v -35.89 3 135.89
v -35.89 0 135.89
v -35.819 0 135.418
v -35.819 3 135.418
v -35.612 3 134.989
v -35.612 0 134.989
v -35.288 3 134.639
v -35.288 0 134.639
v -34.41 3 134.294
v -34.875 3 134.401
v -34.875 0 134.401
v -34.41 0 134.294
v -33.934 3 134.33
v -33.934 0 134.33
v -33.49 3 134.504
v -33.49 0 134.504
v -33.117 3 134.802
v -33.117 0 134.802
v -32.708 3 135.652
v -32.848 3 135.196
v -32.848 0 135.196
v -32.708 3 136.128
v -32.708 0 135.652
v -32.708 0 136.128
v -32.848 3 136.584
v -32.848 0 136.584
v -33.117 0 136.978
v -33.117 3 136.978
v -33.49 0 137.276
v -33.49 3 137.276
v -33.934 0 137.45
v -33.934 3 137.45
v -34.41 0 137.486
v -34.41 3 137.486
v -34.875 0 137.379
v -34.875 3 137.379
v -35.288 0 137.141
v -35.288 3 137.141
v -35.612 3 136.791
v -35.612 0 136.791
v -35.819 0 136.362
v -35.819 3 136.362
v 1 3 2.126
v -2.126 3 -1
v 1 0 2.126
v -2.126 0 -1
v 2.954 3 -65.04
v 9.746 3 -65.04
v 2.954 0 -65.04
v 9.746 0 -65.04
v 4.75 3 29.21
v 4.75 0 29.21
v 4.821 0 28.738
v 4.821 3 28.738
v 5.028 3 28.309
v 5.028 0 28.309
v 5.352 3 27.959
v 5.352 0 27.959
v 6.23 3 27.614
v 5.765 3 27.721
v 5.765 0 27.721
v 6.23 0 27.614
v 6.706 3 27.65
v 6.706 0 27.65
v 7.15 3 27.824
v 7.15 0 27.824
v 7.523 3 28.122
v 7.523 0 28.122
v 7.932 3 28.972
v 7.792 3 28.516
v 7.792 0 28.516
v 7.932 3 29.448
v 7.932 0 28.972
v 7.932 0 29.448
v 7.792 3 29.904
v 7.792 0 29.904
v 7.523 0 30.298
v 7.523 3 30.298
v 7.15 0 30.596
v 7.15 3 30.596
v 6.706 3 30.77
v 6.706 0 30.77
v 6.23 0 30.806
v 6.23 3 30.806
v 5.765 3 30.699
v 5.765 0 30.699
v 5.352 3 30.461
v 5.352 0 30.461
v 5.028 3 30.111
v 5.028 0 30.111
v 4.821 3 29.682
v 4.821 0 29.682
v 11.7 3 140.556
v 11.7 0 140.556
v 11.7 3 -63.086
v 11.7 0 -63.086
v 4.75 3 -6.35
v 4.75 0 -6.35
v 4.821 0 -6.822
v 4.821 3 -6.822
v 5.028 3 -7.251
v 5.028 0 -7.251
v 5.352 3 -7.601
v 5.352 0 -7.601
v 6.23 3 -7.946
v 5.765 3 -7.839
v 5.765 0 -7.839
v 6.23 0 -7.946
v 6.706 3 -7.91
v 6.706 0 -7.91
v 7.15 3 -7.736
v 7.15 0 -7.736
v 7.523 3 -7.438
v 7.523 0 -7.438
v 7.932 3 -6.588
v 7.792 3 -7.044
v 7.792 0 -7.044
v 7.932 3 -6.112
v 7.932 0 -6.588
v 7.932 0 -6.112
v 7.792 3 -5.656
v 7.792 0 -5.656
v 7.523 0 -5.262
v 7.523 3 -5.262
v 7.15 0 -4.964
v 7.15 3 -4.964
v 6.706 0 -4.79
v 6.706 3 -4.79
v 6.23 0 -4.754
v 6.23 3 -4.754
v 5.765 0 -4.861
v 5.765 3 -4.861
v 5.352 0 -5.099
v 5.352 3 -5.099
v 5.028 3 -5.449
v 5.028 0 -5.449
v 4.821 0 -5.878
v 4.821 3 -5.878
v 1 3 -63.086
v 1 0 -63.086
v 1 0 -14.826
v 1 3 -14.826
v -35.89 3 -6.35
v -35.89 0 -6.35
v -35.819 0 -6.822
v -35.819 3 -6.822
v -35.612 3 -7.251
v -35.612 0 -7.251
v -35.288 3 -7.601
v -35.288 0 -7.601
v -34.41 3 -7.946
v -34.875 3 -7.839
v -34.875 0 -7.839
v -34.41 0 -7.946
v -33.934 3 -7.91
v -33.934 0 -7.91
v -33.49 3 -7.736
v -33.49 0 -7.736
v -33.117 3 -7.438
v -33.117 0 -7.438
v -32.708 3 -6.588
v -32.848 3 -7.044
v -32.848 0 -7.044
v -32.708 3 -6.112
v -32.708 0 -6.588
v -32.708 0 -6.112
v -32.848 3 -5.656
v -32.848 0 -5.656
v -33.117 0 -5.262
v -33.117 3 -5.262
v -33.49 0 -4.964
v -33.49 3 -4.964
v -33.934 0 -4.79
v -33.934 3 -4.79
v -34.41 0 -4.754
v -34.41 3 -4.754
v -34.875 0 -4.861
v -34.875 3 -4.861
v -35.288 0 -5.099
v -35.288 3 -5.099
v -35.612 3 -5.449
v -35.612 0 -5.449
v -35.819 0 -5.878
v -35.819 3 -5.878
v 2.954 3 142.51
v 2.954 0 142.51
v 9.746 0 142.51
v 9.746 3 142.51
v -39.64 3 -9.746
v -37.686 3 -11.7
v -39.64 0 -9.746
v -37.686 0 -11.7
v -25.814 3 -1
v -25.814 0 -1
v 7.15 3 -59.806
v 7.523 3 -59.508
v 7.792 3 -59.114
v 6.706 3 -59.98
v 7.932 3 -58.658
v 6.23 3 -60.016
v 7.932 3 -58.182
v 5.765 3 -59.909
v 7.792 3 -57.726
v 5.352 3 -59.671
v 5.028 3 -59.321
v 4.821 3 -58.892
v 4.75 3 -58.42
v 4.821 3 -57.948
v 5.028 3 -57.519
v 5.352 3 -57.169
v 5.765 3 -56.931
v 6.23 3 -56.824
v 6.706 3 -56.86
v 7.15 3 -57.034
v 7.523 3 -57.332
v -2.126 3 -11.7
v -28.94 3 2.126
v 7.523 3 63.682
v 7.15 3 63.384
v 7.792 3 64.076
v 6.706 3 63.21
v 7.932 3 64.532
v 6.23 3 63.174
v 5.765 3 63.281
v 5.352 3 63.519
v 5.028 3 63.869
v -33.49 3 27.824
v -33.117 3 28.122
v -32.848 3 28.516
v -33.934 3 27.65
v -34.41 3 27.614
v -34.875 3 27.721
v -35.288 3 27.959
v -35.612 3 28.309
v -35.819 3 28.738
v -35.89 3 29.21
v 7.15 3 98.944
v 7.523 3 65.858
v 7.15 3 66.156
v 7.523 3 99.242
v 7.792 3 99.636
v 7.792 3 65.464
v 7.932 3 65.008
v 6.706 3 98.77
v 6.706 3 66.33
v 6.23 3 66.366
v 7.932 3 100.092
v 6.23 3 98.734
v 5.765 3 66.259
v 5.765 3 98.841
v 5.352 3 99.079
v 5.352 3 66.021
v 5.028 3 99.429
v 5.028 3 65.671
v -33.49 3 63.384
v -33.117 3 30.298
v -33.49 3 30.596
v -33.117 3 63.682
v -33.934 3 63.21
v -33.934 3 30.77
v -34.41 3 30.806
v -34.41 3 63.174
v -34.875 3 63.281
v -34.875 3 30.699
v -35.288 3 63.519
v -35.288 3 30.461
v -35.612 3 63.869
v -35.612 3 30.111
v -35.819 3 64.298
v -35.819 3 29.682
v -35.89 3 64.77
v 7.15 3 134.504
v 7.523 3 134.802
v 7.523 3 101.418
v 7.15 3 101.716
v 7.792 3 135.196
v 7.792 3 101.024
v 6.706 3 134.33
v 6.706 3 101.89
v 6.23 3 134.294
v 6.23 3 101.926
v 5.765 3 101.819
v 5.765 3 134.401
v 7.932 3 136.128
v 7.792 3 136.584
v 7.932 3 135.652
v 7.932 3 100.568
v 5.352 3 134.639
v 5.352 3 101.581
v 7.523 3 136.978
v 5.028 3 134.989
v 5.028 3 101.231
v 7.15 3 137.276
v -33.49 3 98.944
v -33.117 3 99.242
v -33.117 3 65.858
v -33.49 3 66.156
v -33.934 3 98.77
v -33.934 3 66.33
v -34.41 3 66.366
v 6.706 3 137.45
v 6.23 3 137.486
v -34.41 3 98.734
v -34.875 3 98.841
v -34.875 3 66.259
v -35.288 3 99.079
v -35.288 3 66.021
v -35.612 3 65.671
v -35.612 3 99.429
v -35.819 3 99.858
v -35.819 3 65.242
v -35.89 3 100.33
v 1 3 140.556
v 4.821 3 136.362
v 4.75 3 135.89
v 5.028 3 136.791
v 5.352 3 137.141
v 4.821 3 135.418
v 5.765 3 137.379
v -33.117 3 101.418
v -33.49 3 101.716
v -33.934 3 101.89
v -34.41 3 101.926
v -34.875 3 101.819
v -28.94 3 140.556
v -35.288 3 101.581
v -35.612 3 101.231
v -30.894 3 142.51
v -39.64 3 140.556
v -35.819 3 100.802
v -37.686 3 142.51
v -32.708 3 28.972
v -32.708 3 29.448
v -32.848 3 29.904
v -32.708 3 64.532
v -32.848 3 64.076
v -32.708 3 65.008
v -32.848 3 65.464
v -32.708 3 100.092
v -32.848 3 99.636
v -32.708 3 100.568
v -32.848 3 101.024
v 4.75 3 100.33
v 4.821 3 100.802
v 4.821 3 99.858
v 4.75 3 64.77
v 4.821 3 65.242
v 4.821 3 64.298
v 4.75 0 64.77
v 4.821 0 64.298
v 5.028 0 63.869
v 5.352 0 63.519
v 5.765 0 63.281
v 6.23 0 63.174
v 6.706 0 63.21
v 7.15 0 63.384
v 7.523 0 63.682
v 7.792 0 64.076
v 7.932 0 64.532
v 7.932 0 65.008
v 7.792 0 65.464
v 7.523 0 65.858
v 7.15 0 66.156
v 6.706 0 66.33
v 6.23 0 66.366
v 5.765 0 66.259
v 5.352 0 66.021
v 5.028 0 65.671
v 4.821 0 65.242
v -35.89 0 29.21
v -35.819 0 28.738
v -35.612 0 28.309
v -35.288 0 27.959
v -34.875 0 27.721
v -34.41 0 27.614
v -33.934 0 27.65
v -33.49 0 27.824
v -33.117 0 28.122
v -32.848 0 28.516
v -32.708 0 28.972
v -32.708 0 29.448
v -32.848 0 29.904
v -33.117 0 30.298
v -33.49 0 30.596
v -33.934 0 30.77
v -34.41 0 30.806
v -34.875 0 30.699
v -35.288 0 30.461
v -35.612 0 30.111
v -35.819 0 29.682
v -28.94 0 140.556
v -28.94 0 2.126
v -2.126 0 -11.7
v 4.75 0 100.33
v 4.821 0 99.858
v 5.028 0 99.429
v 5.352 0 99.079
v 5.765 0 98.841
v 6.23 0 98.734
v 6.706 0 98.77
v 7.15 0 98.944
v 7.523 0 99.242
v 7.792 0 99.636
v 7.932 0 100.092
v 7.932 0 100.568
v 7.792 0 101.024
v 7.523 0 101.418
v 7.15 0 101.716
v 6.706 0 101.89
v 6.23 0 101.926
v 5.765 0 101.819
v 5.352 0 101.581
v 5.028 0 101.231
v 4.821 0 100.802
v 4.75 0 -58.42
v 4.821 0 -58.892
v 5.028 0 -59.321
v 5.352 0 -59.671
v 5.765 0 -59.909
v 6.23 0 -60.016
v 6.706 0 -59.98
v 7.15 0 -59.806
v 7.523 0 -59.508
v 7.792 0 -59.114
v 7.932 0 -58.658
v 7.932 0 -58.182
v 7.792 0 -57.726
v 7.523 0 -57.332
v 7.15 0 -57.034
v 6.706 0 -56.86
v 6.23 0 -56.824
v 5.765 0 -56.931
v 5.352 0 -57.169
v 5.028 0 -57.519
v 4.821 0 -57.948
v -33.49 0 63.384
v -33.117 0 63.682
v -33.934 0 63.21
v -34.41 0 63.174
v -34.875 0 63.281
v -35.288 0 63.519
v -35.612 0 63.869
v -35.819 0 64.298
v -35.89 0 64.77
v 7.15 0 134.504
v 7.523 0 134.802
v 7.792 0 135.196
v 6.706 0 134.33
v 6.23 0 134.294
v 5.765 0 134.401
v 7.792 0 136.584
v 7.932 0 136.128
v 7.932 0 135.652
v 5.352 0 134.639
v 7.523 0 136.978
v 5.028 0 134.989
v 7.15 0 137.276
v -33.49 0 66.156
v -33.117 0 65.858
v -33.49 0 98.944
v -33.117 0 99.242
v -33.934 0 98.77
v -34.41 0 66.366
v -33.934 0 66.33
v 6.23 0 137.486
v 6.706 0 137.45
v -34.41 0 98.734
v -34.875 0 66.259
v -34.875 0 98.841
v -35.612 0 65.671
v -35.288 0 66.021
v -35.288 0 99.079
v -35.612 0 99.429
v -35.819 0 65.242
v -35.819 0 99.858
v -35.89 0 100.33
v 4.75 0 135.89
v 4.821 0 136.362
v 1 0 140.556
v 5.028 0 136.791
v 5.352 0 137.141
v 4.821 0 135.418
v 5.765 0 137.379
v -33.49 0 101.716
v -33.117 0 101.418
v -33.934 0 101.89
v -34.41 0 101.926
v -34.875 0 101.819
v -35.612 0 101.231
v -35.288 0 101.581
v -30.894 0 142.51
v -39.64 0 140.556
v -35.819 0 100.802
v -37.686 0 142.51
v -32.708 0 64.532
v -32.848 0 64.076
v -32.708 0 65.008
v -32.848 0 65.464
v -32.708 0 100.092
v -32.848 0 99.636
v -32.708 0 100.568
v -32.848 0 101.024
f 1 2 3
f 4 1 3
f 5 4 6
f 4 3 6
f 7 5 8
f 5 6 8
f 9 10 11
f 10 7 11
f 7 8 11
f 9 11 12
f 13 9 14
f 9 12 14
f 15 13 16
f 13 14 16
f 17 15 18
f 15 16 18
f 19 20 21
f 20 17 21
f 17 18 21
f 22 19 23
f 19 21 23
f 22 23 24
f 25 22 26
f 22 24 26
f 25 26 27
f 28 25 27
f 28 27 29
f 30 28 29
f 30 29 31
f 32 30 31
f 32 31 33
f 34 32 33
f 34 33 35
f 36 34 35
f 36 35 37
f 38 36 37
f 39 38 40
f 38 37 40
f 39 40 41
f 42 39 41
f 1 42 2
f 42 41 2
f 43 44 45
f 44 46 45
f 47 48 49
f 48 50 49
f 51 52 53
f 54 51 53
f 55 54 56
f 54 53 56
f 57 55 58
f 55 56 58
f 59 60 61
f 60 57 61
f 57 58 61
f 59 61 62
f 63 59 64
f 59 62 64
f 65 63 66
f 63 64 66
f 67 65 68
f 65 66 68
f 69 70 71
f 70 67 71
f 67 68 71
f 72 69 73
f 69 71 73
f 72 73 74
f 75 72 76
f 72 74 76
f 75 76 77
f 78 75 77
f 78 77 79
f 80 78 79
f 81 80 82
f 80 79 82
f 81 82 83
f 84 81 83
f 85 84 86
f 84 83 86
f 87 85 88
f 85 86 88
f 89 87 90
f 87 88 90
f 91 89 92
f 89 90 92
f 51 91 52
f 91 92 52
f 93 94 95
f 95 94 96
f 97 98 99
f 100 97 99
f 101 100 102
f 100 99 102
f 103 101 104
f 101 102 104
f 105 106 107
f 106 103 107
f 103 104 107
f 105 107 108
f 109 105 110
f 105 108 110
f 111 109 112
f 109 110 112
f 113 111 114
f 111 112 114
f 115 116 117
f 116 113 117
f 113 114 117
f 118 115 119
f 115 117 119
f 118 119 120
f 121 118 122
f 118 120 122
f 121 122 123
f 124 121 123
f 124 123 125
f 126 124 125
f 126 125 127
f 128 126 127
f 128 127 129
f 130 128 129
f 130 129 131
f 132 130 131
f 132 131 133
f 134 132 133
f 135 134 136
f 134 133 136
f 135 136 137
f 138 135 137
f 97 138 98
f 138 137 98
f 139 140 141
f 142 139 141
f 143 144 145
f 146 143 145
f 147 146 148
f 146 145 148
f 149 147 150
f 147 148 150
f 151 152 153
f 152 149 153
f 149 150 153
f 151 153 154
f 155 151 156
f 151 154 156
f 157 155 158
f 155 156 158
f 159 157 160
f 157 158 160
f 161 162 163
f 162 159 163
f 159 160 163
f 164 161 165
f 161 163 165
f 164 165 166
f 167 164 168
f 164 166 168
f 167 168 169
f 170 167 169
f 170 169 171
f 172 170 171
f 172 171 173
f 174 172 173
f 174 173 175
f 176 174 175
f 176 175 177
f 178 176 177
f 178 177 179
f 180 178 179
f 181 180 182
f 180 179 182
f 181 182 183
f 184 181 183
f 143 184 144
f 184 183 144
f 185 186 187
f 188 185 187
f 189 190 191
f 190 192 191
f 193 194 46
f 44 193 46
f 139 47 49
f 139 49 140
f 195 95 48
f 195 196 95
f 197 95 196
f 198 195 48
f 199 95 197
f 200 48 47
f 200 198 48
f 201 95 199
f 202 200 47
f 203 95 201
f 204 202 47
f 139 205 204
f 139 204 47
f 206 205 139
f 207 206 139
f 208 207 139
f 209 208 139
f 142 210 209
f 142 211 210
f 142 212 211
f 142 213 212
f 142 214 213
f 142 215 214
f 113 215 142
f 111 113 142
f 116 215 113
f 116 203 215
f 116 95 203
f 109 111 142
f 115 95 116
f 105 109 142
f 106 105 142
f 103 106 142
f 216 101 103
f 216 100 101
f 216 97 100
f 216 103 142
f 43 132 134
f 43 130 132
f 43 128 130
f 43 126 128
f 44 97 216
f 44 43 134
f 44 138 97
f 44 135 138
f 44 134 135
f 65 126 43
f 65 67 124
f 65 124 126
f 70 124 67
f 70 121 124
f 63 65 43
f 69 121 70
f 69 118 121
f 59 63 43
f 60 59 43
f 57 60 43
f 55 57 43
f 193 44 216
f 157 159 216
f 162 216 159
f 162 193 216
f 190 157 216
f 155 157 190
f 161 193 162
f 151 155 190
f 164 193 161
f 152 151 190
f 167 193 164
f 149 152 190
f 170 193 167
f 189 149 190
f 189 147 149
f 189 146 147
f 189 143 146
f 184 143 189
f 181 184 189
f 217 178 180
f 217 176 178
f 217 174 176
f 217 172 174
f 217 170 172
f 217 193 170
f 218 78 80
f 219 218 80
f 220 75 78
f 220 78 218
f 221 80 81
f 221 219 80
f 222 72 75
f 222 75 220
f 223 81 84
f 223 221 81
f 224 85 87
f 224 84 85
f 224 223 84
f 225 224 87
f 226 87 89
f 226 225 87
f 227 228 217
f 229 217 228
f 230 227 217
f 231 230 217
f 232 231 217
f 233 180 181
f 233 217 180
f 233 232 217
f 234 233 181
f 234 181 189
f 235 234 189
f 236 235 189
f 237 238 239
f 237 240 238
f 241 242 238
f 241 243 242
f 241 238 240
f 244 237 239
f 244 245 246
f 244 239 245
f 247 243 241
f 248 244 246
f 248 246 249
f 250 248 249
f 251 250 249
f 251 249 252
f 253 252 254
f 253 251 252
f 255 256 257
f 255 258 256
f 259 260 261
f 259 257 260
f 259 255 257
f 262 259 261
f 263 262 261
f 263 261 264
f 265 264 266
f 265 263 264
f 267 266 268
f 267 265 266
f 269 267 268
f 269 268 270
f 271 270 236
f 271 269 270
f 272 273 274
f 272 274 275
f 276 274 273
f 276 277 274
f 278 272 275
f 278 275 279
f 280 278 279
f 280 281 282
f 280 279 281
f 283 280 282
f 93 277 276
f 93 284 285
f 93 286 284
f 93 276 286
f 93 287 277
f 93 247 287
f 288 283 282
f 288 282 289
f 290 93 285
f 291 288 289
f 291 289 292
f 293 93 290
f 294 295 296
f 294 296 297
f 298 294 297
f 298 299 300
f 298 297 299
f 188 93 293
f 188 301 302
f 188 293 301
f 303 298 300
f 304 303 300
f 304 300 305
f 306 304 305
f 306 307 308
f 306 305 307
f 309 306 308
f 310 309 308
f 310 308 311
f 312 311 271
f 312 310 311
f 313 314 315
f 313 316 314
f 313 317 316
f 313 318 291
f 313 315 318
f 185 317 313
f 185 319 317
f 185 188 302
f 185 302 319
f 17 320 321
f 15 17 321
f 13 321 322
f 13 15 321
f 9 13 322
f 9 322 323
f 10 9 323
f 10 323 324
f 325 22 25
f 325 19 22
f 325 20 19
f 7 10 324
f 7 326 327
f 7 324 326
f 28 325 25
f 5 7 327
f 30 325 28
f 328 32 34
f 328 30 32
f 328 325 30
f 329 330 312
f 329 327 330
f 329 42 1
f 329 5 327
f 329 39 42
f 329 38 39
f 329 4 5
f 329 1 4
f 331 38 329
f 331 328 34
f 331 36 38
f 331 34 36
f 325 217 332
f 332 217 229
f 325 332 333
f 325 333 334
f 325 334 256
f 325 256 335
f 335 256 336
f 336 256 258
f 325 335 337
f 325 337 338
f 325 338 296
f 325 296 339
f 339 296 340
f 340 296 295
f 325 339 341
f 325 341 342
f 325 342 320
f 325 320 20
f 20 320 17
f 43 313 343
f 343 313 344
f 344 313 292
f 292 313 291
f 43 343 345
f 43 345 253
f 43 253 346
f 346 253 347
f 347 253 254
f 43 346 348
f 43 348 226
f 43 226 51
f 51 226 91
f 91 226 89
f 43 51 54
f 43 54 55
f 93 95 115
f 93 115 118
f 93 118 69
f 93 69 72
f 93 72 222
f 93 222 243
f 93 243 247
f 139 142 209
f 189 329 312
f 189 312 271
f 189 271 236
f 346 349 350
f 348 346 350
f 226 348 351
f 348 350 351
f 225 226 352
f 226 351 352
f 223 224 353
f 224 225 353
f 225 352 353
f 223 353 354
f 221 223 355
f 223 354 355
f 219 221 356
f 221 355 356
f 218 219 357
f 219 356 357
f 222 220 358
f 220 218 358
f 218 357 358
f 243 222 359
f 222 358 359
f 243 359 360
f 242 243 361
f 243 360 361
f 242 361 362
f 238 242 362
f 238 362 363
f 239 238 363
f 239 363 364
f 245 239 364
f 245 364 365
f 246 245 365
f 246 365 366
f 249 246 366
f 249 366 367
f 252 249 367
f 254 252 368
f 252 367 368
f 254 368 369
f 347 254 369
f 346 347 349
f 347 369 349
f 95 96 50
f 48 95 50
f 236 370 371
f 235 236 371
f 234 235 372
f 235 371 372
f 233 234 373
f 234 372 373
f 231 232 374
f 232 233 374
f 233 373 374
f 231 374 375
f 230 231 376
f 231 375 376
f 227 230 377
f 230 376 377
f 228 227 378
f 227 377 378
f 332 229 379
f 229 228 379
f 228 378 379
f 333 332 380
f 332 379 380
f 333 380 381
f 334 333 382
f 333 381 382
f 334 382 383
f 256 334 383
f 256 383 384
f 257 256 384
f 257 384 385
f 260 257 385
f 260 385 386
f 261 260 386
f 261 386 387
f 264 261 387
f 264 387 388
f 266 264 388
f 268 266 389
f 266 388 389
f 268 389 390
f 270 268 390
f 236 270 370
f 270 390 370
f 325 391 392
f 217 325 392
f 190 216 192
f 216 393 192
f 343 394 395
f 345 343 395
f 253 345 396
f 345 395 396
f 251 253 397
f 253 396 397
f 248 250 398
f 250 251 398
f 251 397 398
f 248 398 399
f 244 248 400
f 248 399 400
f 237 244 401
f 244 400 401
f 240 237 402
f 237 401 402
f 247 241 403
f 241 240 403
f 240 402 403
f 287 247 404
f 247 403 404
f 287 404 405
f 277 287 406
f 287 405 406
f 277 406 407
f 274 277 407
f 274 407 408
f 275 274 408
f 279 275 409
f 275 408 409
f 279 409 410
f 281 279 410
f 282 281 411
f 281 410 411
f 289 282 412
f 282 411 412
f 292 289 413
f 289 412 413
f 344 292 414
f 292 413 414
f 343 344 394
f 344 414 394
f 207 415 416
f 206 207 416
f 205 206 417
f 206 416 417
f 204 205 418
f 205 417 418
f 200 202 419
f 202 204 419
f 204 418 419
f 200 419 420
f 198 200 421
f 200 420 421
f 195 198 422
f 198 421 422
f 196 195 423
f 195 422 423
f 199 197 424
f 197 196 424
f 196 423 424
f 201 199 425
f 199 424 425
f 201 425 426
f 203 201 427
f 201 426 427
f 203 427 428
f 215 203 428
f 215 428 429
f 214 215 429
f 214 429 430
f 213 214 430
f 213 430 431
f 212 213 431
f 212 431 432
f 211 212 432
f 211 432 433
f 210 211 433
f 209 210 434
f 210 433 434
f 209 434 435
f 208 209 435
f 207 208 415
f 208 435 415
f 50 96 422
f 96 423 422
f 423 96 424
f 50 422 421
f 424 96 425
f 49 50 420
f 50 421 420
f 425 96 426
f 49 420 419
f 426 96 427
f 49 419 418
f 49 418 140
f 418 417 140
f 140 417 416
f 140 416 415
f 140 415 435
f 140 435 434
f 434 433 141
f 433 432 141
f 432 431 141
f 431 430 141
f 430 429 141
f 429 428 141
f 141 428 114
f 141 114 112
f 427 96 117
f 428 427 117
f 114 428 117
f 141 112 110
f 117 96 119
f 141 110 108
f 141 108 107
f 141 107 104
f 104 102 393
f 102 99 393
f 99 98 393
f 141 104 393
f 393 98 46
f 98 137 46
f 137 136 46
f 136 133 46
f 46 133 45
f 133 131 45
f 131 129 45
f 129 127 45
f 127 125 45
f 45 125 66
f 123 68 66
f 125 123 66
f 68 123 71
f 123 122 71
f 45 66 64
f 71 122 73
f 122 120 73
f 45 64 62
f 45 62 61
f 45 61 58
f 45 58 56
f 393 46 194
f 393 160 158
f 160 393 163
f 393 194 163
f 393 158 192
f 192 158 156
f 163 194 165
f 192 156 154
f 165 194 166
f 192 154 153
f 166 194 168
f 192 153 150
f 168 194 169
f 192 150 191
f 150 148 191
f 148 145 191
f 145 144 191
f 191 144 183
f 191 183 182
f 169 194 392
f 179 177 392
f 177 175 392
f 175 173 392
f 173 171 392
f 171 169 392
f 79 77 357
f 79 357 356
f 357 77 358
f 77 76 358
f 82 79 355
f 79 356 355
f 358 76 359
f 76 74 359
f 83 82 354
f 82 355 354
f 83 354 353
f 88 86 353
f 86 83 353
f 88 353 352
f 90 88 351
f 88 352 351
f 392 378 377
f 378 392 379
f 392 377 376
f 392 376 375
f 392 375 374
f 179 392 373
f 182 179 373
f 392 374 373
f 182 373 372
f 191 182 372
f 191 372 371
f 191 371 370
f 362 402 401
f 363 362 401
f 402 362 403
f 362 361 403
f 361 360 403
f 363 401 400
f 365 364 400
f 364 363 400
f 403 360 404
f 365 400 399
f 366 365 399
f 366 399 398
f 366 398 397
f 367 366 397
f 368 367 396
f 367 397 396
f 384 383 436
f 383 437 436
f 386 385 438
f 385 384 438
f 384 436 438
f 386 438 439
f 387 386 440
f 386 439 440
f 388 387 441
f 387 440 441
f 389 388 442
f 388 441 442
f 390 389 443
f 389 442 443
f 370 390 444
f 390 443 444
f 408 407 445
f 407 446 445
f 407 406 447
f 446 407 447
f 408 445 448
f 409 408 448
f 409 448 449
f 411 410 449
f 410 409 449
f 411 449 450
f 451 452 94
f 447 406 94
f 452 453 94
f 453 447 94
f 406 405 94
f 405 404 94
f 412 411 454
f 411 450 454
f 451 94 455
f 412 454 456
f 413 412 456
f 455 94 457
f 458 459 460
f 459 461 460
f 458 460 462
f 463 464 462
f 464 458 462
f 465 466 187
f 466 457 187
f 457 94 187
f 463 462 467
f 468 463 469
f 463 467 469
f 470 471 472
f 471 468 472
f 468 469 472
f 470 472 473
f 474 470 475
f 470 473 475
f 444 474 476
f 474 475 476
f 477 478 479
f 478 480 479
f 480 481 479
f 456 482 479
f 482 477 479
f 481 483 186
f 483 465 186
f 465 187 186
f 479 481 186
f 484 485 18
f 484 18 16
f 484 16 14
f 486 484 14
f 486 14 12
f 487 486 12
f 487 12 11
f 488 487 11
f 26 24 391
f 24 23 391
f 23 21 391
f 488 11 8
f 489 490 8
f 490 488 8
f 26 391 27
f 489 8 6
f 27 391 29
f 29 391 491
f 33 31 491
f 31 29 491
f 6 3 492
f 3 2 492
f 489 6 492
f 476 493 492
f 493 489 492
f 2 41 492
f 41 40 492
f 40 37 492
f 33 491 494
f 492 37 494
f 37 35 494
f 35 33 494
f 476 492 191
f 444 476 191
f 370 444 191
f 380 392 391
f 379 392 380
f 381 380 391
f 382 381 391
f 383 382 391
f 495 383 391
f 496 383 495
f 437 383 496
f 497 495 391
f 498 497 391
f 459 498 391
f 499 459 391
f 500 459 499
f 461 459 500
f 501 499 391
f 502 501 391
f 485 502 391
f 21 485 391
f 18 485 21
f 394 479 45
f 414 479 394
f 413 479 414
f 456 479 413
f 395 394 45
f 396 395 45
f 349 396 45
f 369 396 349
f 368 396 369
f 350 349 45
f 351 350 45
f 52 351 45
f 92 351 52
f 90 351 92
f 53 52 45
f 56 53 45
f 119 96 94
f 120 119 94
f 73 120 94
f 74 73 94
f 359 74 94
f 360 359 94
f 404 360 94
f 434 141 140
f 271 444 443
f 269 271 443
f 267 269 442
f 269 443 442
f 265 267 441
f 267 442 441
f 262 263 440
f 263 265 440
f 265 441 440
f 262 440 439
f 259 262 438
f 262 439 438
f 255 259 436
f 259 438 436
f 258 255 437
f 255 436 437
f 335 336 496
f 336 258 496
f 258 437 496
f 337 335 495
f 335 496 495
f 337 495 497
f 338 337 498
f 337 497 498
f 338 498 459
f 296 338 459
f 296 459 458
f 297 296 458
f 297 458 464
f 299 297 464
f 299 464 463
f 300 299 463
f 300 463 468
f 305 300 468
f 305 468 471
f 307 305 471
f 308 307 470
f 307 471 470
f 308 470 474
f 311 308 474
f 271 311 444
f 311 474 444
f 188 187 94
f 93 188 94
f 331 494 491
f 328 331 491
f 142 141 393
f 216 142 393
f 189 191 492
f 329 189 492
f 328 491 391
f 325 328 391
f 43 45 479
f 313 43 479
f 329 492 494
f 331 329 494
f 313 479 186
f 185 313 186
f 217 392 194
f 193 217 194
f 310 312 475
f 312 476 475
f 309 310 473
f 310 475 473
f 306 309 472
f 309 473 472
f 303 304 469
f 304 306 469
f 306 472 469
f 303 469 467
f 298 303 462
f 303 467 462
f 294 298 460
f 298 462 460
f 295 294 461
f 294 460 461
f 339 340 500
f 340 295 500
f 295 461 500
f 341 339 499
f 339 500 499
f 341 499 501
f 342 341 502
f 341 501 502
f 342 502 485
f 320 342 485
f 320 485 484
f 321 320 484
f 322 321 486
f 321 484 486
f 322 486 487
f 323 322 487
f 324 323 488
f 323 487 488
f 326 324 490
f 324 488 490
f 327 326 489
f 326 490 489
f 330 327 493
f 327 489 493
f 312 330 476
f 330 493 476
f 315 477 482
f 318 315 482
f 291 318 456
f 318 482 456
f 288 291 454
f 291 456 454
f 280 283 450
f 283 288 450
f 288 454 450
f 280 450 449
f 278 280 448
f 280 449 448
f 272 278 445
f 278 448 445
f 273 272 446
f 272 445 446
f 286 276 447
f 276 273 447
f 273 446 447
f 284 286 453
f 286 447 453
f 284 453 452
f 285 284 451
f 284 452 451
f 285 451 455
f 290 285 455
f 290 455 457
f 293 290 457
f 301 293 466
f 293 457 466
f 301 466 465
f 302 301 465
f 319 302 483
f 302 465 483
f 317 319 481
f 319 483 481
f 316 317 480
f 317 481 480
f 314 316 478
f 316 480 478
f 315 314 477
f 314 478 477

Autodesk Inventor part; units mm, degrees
ref_plane "YZ Plane" through (0, 0, 0) normal (1, 0, 0) x (0, 1, 0)
ref_plane "XZ Plane" through (0, 0, 0) normal (0, 1, 0) x (-1, 0, 0)
ref_plane "XY Plane" through (0, 0, 0) normal (0, 0, 1) x (1, 0, 0)
sketch "Szkic1" plane through (0, 0, 0) normal (0, 1, 0) x (-1, 0, 0)
  line L0 (38.1, 143.51) -> (30.48, 143.51)
  line L1 (27.94, 140.97) -> (27.94, 2.54)
  line L2 (25.4, 0) -> (2.54, 0)
  line L3 (0, 2.54) -> (0, 140.97)
  line L4 (-2.54, 143.51) -> (-10.16, 143.51)
  line L5 (-12.7, 140.97) -> (-12.7, -63.5)
  line L6 (-10.16, -66.04) -> (-2.54, -66.04)
  line L7 (0, -63.5) -> (0, -15.24)
  line L8 (2.54, -12.7) -> (38.1, -12.7)
  line L9 (40.64, -10.16) -> (40.64, 140.97)
  line L10 (34.29, 143.51) -> (34.29, -12.7) construction
  line L11 (-6.35, -66.04) -> (-6.35, 143.51) construction
  circle A0 centre (34.29, -6.35) radius 1.6
  circle A1 centre (-6.35, -6.35) radius 1.6
  circle A2 centre (34.29, 29.21) radius 1.6
  circle A3 centre (-6.35, 29.21) radius 1.6
  circle A4 centre (34.29, 64.77) radius 1.6
  circle A5 centre (-6.35, 64.77) radius 1.6
  circle A6 centre (34.29, 100.33) radius 1.6
  circle A7 centre (-6.35, 100.33) radius 1.6
  circle A8 centre (34.29, 135.89) radius 1.6
  circle A9 centre (-6.35, 135.89) radius 1.6
  circle A10 centre (-6.35, -58.42) radius 1.6
  line L12 (40.64, -10.16) -> (38.1, -12.7)
  line L13 (25.4, 0) -> (27.94, 2.54)
  line L14 (2.54, -12.7) -> (0, -15.24)
  line L15 (0, 2.54) -> (2.54, 0)
  line L16 (-2.54, -66.04) -> (0, -63.5)
  line L17 (-10.16, -66.04) -> (-12.7, -63.5)
  line L18 (-2.54, 143.51) -> (0, 140.97)
  line L19 (-10.16, 143.51) -> (-12.7, 140.97)
  line L20 (27.94, 140.97) -> (30.48, 143.51)
  line L21 (38.1, 143.51) -> (40.64, 140.97)
  line L22 (19.05, 0) -> (19.05, -6.35) construction
  line L23 (19.05, -6.35) -> (19.05, -12.7) construction
  line L24 (19.05, -6.35) -> (34.29, -6.35) construction
  line L25 (19.05, -6.35) -> (-6.35, -6.35) construction
  line L26 (39.64, 140.5558) -> (37.6858, 142.51)
  line L27 (37.6858, 142.51) -> (30.8942, 142.51)
  line L28 (30.8942, 142.51) -> (28.94, 140.5558)
  line L29 (28.94, 140.5558) -> (28.94, 2.1258)
  line L30 (28.94, 2.1258) -> (25.8142, -1)
  line L31 (25.8142, -1) -> (2.1258, -1)
  line L32 (2.1258, -1) -> (-1, 2.1258)
  line L33 (-1, 2.1258) -> (-1, 140.5558)
  line L34 (-1, 140.5558) -> (-2.9542, 142.51)
  line L35 (-2.9542, 142.51) -> (-9.7458, 142.51)
  line L36 (-9.7458, 142.51) -> (-11.7, 140.5558)
  line L37 (-11.7, 140.5558) -> (-11.7, -63.0858)
  line L38 (-11.7, -63.0858) -> (-9.7458, -65.04)
  line L39 (-9.7458, -65.04) -> (-2.9542, -65.04)
  line L40 (-2.9542, -65.04) -> (-1, -63.0858)
  line L41 (-1, -63.0858) -> (-1, -14.8258)
  line L42 (-1, -14.8258) -> (2.1258, -11.7)
  line L43 (2.1258, -11.7) -> (37.6858, -11.7)
  line L44 (37.6858, -11.7) -> (39.64, -9.7458)
  line L45 (39.64, -9.7458) -> (39.64, 140.5558)
  point P0 (0, 0)
  point P1 (40.64, 143.51)
  point P2 (27.94, 143.51)
  point P3 (27.94, 0)
  point P4 (0, 0)
  point P5 (0, 143.51)
  point P6 (-12.7, 143.51)
  point P7 (-12.7, -66.04)
  point P8 (0, -66.04)
  point P9 (0, -12.7)
  point P10 (40.64, -12.7)
  dimension "d0" = 12.7
  dimension "d1" = 209.55
  dimension "d2" = 156.21
  dimension "d3" = 27.94
  dimension "d4" = 3.2
  dimension "d5" = 3.2
  dimension "d8" = 35.56
  dimension "d13" = 3.2
  dimension "d14" = 7.62
  dimension "d16" = 2.54
  dimension "d17" = 2.54
  dimension "d18" = 2.54
  dimension "d19" = 2.54
  dimension "d20" = 2.54
  dimension "d21" = 2.54
  dimension "d22" = 2.54
  dimension "d23" = 2.54
  dimension "d24" = 2.54
  dimension "d25" = 2.54
  dimension "d26" = 2.54
  dimension "d27" = 2.54
  dimension "d28" = 2.54
  dimension "d29" = 2.54
  dimension "d30" = 2.54
  dimension "d31" = 2.54
  dimension "d32" = 2.54
  dimension "d33" = 2.54
  dimension "d34" = 2.54
  dimension "d35" = 2.54
  dimension "d36" = 12.7
  dimension "d37" = 1
sketch "Szkic2" plane through (0, 0, 0) normal (0, 1, 0) x (-1, 0, 0)
  point P0 (0, 0)
extrude "Wyciągnięcie proste1" add sketch "Szkic1" along normal blind 3 contours L45 L44 L43 L42 L41 L40 L39 L38 L37 L36 L35 L34 L33 L32 L31 L30 L29 L28 L27 L26
equation "\"d17\" = d16"
equation "\"d18\" = d16"
equation "\"d19\" = d18"
equation "\"d20\" = d16"
equation "\"d21\" = d20"
equation "\"d22\" = d16"
equation "\"d23\" = d22"
equation "\"d24\" = d16"
equation "\"d25\" = d24"
equation "\"d26\" = d16"
equation "\"d27\" = d26"
equation "\"d28\" = d16"
equation "\"d29\" = d28"
equation "\"d30\" = d16"
equation "\"d31\" = d30"
equation "\"d32\" = d16"
equation "\"d33\" = d32"
equation "\"d34\" = d16"
equation "\"d35\" = d34"
properties part number "bar_-BattPow"
